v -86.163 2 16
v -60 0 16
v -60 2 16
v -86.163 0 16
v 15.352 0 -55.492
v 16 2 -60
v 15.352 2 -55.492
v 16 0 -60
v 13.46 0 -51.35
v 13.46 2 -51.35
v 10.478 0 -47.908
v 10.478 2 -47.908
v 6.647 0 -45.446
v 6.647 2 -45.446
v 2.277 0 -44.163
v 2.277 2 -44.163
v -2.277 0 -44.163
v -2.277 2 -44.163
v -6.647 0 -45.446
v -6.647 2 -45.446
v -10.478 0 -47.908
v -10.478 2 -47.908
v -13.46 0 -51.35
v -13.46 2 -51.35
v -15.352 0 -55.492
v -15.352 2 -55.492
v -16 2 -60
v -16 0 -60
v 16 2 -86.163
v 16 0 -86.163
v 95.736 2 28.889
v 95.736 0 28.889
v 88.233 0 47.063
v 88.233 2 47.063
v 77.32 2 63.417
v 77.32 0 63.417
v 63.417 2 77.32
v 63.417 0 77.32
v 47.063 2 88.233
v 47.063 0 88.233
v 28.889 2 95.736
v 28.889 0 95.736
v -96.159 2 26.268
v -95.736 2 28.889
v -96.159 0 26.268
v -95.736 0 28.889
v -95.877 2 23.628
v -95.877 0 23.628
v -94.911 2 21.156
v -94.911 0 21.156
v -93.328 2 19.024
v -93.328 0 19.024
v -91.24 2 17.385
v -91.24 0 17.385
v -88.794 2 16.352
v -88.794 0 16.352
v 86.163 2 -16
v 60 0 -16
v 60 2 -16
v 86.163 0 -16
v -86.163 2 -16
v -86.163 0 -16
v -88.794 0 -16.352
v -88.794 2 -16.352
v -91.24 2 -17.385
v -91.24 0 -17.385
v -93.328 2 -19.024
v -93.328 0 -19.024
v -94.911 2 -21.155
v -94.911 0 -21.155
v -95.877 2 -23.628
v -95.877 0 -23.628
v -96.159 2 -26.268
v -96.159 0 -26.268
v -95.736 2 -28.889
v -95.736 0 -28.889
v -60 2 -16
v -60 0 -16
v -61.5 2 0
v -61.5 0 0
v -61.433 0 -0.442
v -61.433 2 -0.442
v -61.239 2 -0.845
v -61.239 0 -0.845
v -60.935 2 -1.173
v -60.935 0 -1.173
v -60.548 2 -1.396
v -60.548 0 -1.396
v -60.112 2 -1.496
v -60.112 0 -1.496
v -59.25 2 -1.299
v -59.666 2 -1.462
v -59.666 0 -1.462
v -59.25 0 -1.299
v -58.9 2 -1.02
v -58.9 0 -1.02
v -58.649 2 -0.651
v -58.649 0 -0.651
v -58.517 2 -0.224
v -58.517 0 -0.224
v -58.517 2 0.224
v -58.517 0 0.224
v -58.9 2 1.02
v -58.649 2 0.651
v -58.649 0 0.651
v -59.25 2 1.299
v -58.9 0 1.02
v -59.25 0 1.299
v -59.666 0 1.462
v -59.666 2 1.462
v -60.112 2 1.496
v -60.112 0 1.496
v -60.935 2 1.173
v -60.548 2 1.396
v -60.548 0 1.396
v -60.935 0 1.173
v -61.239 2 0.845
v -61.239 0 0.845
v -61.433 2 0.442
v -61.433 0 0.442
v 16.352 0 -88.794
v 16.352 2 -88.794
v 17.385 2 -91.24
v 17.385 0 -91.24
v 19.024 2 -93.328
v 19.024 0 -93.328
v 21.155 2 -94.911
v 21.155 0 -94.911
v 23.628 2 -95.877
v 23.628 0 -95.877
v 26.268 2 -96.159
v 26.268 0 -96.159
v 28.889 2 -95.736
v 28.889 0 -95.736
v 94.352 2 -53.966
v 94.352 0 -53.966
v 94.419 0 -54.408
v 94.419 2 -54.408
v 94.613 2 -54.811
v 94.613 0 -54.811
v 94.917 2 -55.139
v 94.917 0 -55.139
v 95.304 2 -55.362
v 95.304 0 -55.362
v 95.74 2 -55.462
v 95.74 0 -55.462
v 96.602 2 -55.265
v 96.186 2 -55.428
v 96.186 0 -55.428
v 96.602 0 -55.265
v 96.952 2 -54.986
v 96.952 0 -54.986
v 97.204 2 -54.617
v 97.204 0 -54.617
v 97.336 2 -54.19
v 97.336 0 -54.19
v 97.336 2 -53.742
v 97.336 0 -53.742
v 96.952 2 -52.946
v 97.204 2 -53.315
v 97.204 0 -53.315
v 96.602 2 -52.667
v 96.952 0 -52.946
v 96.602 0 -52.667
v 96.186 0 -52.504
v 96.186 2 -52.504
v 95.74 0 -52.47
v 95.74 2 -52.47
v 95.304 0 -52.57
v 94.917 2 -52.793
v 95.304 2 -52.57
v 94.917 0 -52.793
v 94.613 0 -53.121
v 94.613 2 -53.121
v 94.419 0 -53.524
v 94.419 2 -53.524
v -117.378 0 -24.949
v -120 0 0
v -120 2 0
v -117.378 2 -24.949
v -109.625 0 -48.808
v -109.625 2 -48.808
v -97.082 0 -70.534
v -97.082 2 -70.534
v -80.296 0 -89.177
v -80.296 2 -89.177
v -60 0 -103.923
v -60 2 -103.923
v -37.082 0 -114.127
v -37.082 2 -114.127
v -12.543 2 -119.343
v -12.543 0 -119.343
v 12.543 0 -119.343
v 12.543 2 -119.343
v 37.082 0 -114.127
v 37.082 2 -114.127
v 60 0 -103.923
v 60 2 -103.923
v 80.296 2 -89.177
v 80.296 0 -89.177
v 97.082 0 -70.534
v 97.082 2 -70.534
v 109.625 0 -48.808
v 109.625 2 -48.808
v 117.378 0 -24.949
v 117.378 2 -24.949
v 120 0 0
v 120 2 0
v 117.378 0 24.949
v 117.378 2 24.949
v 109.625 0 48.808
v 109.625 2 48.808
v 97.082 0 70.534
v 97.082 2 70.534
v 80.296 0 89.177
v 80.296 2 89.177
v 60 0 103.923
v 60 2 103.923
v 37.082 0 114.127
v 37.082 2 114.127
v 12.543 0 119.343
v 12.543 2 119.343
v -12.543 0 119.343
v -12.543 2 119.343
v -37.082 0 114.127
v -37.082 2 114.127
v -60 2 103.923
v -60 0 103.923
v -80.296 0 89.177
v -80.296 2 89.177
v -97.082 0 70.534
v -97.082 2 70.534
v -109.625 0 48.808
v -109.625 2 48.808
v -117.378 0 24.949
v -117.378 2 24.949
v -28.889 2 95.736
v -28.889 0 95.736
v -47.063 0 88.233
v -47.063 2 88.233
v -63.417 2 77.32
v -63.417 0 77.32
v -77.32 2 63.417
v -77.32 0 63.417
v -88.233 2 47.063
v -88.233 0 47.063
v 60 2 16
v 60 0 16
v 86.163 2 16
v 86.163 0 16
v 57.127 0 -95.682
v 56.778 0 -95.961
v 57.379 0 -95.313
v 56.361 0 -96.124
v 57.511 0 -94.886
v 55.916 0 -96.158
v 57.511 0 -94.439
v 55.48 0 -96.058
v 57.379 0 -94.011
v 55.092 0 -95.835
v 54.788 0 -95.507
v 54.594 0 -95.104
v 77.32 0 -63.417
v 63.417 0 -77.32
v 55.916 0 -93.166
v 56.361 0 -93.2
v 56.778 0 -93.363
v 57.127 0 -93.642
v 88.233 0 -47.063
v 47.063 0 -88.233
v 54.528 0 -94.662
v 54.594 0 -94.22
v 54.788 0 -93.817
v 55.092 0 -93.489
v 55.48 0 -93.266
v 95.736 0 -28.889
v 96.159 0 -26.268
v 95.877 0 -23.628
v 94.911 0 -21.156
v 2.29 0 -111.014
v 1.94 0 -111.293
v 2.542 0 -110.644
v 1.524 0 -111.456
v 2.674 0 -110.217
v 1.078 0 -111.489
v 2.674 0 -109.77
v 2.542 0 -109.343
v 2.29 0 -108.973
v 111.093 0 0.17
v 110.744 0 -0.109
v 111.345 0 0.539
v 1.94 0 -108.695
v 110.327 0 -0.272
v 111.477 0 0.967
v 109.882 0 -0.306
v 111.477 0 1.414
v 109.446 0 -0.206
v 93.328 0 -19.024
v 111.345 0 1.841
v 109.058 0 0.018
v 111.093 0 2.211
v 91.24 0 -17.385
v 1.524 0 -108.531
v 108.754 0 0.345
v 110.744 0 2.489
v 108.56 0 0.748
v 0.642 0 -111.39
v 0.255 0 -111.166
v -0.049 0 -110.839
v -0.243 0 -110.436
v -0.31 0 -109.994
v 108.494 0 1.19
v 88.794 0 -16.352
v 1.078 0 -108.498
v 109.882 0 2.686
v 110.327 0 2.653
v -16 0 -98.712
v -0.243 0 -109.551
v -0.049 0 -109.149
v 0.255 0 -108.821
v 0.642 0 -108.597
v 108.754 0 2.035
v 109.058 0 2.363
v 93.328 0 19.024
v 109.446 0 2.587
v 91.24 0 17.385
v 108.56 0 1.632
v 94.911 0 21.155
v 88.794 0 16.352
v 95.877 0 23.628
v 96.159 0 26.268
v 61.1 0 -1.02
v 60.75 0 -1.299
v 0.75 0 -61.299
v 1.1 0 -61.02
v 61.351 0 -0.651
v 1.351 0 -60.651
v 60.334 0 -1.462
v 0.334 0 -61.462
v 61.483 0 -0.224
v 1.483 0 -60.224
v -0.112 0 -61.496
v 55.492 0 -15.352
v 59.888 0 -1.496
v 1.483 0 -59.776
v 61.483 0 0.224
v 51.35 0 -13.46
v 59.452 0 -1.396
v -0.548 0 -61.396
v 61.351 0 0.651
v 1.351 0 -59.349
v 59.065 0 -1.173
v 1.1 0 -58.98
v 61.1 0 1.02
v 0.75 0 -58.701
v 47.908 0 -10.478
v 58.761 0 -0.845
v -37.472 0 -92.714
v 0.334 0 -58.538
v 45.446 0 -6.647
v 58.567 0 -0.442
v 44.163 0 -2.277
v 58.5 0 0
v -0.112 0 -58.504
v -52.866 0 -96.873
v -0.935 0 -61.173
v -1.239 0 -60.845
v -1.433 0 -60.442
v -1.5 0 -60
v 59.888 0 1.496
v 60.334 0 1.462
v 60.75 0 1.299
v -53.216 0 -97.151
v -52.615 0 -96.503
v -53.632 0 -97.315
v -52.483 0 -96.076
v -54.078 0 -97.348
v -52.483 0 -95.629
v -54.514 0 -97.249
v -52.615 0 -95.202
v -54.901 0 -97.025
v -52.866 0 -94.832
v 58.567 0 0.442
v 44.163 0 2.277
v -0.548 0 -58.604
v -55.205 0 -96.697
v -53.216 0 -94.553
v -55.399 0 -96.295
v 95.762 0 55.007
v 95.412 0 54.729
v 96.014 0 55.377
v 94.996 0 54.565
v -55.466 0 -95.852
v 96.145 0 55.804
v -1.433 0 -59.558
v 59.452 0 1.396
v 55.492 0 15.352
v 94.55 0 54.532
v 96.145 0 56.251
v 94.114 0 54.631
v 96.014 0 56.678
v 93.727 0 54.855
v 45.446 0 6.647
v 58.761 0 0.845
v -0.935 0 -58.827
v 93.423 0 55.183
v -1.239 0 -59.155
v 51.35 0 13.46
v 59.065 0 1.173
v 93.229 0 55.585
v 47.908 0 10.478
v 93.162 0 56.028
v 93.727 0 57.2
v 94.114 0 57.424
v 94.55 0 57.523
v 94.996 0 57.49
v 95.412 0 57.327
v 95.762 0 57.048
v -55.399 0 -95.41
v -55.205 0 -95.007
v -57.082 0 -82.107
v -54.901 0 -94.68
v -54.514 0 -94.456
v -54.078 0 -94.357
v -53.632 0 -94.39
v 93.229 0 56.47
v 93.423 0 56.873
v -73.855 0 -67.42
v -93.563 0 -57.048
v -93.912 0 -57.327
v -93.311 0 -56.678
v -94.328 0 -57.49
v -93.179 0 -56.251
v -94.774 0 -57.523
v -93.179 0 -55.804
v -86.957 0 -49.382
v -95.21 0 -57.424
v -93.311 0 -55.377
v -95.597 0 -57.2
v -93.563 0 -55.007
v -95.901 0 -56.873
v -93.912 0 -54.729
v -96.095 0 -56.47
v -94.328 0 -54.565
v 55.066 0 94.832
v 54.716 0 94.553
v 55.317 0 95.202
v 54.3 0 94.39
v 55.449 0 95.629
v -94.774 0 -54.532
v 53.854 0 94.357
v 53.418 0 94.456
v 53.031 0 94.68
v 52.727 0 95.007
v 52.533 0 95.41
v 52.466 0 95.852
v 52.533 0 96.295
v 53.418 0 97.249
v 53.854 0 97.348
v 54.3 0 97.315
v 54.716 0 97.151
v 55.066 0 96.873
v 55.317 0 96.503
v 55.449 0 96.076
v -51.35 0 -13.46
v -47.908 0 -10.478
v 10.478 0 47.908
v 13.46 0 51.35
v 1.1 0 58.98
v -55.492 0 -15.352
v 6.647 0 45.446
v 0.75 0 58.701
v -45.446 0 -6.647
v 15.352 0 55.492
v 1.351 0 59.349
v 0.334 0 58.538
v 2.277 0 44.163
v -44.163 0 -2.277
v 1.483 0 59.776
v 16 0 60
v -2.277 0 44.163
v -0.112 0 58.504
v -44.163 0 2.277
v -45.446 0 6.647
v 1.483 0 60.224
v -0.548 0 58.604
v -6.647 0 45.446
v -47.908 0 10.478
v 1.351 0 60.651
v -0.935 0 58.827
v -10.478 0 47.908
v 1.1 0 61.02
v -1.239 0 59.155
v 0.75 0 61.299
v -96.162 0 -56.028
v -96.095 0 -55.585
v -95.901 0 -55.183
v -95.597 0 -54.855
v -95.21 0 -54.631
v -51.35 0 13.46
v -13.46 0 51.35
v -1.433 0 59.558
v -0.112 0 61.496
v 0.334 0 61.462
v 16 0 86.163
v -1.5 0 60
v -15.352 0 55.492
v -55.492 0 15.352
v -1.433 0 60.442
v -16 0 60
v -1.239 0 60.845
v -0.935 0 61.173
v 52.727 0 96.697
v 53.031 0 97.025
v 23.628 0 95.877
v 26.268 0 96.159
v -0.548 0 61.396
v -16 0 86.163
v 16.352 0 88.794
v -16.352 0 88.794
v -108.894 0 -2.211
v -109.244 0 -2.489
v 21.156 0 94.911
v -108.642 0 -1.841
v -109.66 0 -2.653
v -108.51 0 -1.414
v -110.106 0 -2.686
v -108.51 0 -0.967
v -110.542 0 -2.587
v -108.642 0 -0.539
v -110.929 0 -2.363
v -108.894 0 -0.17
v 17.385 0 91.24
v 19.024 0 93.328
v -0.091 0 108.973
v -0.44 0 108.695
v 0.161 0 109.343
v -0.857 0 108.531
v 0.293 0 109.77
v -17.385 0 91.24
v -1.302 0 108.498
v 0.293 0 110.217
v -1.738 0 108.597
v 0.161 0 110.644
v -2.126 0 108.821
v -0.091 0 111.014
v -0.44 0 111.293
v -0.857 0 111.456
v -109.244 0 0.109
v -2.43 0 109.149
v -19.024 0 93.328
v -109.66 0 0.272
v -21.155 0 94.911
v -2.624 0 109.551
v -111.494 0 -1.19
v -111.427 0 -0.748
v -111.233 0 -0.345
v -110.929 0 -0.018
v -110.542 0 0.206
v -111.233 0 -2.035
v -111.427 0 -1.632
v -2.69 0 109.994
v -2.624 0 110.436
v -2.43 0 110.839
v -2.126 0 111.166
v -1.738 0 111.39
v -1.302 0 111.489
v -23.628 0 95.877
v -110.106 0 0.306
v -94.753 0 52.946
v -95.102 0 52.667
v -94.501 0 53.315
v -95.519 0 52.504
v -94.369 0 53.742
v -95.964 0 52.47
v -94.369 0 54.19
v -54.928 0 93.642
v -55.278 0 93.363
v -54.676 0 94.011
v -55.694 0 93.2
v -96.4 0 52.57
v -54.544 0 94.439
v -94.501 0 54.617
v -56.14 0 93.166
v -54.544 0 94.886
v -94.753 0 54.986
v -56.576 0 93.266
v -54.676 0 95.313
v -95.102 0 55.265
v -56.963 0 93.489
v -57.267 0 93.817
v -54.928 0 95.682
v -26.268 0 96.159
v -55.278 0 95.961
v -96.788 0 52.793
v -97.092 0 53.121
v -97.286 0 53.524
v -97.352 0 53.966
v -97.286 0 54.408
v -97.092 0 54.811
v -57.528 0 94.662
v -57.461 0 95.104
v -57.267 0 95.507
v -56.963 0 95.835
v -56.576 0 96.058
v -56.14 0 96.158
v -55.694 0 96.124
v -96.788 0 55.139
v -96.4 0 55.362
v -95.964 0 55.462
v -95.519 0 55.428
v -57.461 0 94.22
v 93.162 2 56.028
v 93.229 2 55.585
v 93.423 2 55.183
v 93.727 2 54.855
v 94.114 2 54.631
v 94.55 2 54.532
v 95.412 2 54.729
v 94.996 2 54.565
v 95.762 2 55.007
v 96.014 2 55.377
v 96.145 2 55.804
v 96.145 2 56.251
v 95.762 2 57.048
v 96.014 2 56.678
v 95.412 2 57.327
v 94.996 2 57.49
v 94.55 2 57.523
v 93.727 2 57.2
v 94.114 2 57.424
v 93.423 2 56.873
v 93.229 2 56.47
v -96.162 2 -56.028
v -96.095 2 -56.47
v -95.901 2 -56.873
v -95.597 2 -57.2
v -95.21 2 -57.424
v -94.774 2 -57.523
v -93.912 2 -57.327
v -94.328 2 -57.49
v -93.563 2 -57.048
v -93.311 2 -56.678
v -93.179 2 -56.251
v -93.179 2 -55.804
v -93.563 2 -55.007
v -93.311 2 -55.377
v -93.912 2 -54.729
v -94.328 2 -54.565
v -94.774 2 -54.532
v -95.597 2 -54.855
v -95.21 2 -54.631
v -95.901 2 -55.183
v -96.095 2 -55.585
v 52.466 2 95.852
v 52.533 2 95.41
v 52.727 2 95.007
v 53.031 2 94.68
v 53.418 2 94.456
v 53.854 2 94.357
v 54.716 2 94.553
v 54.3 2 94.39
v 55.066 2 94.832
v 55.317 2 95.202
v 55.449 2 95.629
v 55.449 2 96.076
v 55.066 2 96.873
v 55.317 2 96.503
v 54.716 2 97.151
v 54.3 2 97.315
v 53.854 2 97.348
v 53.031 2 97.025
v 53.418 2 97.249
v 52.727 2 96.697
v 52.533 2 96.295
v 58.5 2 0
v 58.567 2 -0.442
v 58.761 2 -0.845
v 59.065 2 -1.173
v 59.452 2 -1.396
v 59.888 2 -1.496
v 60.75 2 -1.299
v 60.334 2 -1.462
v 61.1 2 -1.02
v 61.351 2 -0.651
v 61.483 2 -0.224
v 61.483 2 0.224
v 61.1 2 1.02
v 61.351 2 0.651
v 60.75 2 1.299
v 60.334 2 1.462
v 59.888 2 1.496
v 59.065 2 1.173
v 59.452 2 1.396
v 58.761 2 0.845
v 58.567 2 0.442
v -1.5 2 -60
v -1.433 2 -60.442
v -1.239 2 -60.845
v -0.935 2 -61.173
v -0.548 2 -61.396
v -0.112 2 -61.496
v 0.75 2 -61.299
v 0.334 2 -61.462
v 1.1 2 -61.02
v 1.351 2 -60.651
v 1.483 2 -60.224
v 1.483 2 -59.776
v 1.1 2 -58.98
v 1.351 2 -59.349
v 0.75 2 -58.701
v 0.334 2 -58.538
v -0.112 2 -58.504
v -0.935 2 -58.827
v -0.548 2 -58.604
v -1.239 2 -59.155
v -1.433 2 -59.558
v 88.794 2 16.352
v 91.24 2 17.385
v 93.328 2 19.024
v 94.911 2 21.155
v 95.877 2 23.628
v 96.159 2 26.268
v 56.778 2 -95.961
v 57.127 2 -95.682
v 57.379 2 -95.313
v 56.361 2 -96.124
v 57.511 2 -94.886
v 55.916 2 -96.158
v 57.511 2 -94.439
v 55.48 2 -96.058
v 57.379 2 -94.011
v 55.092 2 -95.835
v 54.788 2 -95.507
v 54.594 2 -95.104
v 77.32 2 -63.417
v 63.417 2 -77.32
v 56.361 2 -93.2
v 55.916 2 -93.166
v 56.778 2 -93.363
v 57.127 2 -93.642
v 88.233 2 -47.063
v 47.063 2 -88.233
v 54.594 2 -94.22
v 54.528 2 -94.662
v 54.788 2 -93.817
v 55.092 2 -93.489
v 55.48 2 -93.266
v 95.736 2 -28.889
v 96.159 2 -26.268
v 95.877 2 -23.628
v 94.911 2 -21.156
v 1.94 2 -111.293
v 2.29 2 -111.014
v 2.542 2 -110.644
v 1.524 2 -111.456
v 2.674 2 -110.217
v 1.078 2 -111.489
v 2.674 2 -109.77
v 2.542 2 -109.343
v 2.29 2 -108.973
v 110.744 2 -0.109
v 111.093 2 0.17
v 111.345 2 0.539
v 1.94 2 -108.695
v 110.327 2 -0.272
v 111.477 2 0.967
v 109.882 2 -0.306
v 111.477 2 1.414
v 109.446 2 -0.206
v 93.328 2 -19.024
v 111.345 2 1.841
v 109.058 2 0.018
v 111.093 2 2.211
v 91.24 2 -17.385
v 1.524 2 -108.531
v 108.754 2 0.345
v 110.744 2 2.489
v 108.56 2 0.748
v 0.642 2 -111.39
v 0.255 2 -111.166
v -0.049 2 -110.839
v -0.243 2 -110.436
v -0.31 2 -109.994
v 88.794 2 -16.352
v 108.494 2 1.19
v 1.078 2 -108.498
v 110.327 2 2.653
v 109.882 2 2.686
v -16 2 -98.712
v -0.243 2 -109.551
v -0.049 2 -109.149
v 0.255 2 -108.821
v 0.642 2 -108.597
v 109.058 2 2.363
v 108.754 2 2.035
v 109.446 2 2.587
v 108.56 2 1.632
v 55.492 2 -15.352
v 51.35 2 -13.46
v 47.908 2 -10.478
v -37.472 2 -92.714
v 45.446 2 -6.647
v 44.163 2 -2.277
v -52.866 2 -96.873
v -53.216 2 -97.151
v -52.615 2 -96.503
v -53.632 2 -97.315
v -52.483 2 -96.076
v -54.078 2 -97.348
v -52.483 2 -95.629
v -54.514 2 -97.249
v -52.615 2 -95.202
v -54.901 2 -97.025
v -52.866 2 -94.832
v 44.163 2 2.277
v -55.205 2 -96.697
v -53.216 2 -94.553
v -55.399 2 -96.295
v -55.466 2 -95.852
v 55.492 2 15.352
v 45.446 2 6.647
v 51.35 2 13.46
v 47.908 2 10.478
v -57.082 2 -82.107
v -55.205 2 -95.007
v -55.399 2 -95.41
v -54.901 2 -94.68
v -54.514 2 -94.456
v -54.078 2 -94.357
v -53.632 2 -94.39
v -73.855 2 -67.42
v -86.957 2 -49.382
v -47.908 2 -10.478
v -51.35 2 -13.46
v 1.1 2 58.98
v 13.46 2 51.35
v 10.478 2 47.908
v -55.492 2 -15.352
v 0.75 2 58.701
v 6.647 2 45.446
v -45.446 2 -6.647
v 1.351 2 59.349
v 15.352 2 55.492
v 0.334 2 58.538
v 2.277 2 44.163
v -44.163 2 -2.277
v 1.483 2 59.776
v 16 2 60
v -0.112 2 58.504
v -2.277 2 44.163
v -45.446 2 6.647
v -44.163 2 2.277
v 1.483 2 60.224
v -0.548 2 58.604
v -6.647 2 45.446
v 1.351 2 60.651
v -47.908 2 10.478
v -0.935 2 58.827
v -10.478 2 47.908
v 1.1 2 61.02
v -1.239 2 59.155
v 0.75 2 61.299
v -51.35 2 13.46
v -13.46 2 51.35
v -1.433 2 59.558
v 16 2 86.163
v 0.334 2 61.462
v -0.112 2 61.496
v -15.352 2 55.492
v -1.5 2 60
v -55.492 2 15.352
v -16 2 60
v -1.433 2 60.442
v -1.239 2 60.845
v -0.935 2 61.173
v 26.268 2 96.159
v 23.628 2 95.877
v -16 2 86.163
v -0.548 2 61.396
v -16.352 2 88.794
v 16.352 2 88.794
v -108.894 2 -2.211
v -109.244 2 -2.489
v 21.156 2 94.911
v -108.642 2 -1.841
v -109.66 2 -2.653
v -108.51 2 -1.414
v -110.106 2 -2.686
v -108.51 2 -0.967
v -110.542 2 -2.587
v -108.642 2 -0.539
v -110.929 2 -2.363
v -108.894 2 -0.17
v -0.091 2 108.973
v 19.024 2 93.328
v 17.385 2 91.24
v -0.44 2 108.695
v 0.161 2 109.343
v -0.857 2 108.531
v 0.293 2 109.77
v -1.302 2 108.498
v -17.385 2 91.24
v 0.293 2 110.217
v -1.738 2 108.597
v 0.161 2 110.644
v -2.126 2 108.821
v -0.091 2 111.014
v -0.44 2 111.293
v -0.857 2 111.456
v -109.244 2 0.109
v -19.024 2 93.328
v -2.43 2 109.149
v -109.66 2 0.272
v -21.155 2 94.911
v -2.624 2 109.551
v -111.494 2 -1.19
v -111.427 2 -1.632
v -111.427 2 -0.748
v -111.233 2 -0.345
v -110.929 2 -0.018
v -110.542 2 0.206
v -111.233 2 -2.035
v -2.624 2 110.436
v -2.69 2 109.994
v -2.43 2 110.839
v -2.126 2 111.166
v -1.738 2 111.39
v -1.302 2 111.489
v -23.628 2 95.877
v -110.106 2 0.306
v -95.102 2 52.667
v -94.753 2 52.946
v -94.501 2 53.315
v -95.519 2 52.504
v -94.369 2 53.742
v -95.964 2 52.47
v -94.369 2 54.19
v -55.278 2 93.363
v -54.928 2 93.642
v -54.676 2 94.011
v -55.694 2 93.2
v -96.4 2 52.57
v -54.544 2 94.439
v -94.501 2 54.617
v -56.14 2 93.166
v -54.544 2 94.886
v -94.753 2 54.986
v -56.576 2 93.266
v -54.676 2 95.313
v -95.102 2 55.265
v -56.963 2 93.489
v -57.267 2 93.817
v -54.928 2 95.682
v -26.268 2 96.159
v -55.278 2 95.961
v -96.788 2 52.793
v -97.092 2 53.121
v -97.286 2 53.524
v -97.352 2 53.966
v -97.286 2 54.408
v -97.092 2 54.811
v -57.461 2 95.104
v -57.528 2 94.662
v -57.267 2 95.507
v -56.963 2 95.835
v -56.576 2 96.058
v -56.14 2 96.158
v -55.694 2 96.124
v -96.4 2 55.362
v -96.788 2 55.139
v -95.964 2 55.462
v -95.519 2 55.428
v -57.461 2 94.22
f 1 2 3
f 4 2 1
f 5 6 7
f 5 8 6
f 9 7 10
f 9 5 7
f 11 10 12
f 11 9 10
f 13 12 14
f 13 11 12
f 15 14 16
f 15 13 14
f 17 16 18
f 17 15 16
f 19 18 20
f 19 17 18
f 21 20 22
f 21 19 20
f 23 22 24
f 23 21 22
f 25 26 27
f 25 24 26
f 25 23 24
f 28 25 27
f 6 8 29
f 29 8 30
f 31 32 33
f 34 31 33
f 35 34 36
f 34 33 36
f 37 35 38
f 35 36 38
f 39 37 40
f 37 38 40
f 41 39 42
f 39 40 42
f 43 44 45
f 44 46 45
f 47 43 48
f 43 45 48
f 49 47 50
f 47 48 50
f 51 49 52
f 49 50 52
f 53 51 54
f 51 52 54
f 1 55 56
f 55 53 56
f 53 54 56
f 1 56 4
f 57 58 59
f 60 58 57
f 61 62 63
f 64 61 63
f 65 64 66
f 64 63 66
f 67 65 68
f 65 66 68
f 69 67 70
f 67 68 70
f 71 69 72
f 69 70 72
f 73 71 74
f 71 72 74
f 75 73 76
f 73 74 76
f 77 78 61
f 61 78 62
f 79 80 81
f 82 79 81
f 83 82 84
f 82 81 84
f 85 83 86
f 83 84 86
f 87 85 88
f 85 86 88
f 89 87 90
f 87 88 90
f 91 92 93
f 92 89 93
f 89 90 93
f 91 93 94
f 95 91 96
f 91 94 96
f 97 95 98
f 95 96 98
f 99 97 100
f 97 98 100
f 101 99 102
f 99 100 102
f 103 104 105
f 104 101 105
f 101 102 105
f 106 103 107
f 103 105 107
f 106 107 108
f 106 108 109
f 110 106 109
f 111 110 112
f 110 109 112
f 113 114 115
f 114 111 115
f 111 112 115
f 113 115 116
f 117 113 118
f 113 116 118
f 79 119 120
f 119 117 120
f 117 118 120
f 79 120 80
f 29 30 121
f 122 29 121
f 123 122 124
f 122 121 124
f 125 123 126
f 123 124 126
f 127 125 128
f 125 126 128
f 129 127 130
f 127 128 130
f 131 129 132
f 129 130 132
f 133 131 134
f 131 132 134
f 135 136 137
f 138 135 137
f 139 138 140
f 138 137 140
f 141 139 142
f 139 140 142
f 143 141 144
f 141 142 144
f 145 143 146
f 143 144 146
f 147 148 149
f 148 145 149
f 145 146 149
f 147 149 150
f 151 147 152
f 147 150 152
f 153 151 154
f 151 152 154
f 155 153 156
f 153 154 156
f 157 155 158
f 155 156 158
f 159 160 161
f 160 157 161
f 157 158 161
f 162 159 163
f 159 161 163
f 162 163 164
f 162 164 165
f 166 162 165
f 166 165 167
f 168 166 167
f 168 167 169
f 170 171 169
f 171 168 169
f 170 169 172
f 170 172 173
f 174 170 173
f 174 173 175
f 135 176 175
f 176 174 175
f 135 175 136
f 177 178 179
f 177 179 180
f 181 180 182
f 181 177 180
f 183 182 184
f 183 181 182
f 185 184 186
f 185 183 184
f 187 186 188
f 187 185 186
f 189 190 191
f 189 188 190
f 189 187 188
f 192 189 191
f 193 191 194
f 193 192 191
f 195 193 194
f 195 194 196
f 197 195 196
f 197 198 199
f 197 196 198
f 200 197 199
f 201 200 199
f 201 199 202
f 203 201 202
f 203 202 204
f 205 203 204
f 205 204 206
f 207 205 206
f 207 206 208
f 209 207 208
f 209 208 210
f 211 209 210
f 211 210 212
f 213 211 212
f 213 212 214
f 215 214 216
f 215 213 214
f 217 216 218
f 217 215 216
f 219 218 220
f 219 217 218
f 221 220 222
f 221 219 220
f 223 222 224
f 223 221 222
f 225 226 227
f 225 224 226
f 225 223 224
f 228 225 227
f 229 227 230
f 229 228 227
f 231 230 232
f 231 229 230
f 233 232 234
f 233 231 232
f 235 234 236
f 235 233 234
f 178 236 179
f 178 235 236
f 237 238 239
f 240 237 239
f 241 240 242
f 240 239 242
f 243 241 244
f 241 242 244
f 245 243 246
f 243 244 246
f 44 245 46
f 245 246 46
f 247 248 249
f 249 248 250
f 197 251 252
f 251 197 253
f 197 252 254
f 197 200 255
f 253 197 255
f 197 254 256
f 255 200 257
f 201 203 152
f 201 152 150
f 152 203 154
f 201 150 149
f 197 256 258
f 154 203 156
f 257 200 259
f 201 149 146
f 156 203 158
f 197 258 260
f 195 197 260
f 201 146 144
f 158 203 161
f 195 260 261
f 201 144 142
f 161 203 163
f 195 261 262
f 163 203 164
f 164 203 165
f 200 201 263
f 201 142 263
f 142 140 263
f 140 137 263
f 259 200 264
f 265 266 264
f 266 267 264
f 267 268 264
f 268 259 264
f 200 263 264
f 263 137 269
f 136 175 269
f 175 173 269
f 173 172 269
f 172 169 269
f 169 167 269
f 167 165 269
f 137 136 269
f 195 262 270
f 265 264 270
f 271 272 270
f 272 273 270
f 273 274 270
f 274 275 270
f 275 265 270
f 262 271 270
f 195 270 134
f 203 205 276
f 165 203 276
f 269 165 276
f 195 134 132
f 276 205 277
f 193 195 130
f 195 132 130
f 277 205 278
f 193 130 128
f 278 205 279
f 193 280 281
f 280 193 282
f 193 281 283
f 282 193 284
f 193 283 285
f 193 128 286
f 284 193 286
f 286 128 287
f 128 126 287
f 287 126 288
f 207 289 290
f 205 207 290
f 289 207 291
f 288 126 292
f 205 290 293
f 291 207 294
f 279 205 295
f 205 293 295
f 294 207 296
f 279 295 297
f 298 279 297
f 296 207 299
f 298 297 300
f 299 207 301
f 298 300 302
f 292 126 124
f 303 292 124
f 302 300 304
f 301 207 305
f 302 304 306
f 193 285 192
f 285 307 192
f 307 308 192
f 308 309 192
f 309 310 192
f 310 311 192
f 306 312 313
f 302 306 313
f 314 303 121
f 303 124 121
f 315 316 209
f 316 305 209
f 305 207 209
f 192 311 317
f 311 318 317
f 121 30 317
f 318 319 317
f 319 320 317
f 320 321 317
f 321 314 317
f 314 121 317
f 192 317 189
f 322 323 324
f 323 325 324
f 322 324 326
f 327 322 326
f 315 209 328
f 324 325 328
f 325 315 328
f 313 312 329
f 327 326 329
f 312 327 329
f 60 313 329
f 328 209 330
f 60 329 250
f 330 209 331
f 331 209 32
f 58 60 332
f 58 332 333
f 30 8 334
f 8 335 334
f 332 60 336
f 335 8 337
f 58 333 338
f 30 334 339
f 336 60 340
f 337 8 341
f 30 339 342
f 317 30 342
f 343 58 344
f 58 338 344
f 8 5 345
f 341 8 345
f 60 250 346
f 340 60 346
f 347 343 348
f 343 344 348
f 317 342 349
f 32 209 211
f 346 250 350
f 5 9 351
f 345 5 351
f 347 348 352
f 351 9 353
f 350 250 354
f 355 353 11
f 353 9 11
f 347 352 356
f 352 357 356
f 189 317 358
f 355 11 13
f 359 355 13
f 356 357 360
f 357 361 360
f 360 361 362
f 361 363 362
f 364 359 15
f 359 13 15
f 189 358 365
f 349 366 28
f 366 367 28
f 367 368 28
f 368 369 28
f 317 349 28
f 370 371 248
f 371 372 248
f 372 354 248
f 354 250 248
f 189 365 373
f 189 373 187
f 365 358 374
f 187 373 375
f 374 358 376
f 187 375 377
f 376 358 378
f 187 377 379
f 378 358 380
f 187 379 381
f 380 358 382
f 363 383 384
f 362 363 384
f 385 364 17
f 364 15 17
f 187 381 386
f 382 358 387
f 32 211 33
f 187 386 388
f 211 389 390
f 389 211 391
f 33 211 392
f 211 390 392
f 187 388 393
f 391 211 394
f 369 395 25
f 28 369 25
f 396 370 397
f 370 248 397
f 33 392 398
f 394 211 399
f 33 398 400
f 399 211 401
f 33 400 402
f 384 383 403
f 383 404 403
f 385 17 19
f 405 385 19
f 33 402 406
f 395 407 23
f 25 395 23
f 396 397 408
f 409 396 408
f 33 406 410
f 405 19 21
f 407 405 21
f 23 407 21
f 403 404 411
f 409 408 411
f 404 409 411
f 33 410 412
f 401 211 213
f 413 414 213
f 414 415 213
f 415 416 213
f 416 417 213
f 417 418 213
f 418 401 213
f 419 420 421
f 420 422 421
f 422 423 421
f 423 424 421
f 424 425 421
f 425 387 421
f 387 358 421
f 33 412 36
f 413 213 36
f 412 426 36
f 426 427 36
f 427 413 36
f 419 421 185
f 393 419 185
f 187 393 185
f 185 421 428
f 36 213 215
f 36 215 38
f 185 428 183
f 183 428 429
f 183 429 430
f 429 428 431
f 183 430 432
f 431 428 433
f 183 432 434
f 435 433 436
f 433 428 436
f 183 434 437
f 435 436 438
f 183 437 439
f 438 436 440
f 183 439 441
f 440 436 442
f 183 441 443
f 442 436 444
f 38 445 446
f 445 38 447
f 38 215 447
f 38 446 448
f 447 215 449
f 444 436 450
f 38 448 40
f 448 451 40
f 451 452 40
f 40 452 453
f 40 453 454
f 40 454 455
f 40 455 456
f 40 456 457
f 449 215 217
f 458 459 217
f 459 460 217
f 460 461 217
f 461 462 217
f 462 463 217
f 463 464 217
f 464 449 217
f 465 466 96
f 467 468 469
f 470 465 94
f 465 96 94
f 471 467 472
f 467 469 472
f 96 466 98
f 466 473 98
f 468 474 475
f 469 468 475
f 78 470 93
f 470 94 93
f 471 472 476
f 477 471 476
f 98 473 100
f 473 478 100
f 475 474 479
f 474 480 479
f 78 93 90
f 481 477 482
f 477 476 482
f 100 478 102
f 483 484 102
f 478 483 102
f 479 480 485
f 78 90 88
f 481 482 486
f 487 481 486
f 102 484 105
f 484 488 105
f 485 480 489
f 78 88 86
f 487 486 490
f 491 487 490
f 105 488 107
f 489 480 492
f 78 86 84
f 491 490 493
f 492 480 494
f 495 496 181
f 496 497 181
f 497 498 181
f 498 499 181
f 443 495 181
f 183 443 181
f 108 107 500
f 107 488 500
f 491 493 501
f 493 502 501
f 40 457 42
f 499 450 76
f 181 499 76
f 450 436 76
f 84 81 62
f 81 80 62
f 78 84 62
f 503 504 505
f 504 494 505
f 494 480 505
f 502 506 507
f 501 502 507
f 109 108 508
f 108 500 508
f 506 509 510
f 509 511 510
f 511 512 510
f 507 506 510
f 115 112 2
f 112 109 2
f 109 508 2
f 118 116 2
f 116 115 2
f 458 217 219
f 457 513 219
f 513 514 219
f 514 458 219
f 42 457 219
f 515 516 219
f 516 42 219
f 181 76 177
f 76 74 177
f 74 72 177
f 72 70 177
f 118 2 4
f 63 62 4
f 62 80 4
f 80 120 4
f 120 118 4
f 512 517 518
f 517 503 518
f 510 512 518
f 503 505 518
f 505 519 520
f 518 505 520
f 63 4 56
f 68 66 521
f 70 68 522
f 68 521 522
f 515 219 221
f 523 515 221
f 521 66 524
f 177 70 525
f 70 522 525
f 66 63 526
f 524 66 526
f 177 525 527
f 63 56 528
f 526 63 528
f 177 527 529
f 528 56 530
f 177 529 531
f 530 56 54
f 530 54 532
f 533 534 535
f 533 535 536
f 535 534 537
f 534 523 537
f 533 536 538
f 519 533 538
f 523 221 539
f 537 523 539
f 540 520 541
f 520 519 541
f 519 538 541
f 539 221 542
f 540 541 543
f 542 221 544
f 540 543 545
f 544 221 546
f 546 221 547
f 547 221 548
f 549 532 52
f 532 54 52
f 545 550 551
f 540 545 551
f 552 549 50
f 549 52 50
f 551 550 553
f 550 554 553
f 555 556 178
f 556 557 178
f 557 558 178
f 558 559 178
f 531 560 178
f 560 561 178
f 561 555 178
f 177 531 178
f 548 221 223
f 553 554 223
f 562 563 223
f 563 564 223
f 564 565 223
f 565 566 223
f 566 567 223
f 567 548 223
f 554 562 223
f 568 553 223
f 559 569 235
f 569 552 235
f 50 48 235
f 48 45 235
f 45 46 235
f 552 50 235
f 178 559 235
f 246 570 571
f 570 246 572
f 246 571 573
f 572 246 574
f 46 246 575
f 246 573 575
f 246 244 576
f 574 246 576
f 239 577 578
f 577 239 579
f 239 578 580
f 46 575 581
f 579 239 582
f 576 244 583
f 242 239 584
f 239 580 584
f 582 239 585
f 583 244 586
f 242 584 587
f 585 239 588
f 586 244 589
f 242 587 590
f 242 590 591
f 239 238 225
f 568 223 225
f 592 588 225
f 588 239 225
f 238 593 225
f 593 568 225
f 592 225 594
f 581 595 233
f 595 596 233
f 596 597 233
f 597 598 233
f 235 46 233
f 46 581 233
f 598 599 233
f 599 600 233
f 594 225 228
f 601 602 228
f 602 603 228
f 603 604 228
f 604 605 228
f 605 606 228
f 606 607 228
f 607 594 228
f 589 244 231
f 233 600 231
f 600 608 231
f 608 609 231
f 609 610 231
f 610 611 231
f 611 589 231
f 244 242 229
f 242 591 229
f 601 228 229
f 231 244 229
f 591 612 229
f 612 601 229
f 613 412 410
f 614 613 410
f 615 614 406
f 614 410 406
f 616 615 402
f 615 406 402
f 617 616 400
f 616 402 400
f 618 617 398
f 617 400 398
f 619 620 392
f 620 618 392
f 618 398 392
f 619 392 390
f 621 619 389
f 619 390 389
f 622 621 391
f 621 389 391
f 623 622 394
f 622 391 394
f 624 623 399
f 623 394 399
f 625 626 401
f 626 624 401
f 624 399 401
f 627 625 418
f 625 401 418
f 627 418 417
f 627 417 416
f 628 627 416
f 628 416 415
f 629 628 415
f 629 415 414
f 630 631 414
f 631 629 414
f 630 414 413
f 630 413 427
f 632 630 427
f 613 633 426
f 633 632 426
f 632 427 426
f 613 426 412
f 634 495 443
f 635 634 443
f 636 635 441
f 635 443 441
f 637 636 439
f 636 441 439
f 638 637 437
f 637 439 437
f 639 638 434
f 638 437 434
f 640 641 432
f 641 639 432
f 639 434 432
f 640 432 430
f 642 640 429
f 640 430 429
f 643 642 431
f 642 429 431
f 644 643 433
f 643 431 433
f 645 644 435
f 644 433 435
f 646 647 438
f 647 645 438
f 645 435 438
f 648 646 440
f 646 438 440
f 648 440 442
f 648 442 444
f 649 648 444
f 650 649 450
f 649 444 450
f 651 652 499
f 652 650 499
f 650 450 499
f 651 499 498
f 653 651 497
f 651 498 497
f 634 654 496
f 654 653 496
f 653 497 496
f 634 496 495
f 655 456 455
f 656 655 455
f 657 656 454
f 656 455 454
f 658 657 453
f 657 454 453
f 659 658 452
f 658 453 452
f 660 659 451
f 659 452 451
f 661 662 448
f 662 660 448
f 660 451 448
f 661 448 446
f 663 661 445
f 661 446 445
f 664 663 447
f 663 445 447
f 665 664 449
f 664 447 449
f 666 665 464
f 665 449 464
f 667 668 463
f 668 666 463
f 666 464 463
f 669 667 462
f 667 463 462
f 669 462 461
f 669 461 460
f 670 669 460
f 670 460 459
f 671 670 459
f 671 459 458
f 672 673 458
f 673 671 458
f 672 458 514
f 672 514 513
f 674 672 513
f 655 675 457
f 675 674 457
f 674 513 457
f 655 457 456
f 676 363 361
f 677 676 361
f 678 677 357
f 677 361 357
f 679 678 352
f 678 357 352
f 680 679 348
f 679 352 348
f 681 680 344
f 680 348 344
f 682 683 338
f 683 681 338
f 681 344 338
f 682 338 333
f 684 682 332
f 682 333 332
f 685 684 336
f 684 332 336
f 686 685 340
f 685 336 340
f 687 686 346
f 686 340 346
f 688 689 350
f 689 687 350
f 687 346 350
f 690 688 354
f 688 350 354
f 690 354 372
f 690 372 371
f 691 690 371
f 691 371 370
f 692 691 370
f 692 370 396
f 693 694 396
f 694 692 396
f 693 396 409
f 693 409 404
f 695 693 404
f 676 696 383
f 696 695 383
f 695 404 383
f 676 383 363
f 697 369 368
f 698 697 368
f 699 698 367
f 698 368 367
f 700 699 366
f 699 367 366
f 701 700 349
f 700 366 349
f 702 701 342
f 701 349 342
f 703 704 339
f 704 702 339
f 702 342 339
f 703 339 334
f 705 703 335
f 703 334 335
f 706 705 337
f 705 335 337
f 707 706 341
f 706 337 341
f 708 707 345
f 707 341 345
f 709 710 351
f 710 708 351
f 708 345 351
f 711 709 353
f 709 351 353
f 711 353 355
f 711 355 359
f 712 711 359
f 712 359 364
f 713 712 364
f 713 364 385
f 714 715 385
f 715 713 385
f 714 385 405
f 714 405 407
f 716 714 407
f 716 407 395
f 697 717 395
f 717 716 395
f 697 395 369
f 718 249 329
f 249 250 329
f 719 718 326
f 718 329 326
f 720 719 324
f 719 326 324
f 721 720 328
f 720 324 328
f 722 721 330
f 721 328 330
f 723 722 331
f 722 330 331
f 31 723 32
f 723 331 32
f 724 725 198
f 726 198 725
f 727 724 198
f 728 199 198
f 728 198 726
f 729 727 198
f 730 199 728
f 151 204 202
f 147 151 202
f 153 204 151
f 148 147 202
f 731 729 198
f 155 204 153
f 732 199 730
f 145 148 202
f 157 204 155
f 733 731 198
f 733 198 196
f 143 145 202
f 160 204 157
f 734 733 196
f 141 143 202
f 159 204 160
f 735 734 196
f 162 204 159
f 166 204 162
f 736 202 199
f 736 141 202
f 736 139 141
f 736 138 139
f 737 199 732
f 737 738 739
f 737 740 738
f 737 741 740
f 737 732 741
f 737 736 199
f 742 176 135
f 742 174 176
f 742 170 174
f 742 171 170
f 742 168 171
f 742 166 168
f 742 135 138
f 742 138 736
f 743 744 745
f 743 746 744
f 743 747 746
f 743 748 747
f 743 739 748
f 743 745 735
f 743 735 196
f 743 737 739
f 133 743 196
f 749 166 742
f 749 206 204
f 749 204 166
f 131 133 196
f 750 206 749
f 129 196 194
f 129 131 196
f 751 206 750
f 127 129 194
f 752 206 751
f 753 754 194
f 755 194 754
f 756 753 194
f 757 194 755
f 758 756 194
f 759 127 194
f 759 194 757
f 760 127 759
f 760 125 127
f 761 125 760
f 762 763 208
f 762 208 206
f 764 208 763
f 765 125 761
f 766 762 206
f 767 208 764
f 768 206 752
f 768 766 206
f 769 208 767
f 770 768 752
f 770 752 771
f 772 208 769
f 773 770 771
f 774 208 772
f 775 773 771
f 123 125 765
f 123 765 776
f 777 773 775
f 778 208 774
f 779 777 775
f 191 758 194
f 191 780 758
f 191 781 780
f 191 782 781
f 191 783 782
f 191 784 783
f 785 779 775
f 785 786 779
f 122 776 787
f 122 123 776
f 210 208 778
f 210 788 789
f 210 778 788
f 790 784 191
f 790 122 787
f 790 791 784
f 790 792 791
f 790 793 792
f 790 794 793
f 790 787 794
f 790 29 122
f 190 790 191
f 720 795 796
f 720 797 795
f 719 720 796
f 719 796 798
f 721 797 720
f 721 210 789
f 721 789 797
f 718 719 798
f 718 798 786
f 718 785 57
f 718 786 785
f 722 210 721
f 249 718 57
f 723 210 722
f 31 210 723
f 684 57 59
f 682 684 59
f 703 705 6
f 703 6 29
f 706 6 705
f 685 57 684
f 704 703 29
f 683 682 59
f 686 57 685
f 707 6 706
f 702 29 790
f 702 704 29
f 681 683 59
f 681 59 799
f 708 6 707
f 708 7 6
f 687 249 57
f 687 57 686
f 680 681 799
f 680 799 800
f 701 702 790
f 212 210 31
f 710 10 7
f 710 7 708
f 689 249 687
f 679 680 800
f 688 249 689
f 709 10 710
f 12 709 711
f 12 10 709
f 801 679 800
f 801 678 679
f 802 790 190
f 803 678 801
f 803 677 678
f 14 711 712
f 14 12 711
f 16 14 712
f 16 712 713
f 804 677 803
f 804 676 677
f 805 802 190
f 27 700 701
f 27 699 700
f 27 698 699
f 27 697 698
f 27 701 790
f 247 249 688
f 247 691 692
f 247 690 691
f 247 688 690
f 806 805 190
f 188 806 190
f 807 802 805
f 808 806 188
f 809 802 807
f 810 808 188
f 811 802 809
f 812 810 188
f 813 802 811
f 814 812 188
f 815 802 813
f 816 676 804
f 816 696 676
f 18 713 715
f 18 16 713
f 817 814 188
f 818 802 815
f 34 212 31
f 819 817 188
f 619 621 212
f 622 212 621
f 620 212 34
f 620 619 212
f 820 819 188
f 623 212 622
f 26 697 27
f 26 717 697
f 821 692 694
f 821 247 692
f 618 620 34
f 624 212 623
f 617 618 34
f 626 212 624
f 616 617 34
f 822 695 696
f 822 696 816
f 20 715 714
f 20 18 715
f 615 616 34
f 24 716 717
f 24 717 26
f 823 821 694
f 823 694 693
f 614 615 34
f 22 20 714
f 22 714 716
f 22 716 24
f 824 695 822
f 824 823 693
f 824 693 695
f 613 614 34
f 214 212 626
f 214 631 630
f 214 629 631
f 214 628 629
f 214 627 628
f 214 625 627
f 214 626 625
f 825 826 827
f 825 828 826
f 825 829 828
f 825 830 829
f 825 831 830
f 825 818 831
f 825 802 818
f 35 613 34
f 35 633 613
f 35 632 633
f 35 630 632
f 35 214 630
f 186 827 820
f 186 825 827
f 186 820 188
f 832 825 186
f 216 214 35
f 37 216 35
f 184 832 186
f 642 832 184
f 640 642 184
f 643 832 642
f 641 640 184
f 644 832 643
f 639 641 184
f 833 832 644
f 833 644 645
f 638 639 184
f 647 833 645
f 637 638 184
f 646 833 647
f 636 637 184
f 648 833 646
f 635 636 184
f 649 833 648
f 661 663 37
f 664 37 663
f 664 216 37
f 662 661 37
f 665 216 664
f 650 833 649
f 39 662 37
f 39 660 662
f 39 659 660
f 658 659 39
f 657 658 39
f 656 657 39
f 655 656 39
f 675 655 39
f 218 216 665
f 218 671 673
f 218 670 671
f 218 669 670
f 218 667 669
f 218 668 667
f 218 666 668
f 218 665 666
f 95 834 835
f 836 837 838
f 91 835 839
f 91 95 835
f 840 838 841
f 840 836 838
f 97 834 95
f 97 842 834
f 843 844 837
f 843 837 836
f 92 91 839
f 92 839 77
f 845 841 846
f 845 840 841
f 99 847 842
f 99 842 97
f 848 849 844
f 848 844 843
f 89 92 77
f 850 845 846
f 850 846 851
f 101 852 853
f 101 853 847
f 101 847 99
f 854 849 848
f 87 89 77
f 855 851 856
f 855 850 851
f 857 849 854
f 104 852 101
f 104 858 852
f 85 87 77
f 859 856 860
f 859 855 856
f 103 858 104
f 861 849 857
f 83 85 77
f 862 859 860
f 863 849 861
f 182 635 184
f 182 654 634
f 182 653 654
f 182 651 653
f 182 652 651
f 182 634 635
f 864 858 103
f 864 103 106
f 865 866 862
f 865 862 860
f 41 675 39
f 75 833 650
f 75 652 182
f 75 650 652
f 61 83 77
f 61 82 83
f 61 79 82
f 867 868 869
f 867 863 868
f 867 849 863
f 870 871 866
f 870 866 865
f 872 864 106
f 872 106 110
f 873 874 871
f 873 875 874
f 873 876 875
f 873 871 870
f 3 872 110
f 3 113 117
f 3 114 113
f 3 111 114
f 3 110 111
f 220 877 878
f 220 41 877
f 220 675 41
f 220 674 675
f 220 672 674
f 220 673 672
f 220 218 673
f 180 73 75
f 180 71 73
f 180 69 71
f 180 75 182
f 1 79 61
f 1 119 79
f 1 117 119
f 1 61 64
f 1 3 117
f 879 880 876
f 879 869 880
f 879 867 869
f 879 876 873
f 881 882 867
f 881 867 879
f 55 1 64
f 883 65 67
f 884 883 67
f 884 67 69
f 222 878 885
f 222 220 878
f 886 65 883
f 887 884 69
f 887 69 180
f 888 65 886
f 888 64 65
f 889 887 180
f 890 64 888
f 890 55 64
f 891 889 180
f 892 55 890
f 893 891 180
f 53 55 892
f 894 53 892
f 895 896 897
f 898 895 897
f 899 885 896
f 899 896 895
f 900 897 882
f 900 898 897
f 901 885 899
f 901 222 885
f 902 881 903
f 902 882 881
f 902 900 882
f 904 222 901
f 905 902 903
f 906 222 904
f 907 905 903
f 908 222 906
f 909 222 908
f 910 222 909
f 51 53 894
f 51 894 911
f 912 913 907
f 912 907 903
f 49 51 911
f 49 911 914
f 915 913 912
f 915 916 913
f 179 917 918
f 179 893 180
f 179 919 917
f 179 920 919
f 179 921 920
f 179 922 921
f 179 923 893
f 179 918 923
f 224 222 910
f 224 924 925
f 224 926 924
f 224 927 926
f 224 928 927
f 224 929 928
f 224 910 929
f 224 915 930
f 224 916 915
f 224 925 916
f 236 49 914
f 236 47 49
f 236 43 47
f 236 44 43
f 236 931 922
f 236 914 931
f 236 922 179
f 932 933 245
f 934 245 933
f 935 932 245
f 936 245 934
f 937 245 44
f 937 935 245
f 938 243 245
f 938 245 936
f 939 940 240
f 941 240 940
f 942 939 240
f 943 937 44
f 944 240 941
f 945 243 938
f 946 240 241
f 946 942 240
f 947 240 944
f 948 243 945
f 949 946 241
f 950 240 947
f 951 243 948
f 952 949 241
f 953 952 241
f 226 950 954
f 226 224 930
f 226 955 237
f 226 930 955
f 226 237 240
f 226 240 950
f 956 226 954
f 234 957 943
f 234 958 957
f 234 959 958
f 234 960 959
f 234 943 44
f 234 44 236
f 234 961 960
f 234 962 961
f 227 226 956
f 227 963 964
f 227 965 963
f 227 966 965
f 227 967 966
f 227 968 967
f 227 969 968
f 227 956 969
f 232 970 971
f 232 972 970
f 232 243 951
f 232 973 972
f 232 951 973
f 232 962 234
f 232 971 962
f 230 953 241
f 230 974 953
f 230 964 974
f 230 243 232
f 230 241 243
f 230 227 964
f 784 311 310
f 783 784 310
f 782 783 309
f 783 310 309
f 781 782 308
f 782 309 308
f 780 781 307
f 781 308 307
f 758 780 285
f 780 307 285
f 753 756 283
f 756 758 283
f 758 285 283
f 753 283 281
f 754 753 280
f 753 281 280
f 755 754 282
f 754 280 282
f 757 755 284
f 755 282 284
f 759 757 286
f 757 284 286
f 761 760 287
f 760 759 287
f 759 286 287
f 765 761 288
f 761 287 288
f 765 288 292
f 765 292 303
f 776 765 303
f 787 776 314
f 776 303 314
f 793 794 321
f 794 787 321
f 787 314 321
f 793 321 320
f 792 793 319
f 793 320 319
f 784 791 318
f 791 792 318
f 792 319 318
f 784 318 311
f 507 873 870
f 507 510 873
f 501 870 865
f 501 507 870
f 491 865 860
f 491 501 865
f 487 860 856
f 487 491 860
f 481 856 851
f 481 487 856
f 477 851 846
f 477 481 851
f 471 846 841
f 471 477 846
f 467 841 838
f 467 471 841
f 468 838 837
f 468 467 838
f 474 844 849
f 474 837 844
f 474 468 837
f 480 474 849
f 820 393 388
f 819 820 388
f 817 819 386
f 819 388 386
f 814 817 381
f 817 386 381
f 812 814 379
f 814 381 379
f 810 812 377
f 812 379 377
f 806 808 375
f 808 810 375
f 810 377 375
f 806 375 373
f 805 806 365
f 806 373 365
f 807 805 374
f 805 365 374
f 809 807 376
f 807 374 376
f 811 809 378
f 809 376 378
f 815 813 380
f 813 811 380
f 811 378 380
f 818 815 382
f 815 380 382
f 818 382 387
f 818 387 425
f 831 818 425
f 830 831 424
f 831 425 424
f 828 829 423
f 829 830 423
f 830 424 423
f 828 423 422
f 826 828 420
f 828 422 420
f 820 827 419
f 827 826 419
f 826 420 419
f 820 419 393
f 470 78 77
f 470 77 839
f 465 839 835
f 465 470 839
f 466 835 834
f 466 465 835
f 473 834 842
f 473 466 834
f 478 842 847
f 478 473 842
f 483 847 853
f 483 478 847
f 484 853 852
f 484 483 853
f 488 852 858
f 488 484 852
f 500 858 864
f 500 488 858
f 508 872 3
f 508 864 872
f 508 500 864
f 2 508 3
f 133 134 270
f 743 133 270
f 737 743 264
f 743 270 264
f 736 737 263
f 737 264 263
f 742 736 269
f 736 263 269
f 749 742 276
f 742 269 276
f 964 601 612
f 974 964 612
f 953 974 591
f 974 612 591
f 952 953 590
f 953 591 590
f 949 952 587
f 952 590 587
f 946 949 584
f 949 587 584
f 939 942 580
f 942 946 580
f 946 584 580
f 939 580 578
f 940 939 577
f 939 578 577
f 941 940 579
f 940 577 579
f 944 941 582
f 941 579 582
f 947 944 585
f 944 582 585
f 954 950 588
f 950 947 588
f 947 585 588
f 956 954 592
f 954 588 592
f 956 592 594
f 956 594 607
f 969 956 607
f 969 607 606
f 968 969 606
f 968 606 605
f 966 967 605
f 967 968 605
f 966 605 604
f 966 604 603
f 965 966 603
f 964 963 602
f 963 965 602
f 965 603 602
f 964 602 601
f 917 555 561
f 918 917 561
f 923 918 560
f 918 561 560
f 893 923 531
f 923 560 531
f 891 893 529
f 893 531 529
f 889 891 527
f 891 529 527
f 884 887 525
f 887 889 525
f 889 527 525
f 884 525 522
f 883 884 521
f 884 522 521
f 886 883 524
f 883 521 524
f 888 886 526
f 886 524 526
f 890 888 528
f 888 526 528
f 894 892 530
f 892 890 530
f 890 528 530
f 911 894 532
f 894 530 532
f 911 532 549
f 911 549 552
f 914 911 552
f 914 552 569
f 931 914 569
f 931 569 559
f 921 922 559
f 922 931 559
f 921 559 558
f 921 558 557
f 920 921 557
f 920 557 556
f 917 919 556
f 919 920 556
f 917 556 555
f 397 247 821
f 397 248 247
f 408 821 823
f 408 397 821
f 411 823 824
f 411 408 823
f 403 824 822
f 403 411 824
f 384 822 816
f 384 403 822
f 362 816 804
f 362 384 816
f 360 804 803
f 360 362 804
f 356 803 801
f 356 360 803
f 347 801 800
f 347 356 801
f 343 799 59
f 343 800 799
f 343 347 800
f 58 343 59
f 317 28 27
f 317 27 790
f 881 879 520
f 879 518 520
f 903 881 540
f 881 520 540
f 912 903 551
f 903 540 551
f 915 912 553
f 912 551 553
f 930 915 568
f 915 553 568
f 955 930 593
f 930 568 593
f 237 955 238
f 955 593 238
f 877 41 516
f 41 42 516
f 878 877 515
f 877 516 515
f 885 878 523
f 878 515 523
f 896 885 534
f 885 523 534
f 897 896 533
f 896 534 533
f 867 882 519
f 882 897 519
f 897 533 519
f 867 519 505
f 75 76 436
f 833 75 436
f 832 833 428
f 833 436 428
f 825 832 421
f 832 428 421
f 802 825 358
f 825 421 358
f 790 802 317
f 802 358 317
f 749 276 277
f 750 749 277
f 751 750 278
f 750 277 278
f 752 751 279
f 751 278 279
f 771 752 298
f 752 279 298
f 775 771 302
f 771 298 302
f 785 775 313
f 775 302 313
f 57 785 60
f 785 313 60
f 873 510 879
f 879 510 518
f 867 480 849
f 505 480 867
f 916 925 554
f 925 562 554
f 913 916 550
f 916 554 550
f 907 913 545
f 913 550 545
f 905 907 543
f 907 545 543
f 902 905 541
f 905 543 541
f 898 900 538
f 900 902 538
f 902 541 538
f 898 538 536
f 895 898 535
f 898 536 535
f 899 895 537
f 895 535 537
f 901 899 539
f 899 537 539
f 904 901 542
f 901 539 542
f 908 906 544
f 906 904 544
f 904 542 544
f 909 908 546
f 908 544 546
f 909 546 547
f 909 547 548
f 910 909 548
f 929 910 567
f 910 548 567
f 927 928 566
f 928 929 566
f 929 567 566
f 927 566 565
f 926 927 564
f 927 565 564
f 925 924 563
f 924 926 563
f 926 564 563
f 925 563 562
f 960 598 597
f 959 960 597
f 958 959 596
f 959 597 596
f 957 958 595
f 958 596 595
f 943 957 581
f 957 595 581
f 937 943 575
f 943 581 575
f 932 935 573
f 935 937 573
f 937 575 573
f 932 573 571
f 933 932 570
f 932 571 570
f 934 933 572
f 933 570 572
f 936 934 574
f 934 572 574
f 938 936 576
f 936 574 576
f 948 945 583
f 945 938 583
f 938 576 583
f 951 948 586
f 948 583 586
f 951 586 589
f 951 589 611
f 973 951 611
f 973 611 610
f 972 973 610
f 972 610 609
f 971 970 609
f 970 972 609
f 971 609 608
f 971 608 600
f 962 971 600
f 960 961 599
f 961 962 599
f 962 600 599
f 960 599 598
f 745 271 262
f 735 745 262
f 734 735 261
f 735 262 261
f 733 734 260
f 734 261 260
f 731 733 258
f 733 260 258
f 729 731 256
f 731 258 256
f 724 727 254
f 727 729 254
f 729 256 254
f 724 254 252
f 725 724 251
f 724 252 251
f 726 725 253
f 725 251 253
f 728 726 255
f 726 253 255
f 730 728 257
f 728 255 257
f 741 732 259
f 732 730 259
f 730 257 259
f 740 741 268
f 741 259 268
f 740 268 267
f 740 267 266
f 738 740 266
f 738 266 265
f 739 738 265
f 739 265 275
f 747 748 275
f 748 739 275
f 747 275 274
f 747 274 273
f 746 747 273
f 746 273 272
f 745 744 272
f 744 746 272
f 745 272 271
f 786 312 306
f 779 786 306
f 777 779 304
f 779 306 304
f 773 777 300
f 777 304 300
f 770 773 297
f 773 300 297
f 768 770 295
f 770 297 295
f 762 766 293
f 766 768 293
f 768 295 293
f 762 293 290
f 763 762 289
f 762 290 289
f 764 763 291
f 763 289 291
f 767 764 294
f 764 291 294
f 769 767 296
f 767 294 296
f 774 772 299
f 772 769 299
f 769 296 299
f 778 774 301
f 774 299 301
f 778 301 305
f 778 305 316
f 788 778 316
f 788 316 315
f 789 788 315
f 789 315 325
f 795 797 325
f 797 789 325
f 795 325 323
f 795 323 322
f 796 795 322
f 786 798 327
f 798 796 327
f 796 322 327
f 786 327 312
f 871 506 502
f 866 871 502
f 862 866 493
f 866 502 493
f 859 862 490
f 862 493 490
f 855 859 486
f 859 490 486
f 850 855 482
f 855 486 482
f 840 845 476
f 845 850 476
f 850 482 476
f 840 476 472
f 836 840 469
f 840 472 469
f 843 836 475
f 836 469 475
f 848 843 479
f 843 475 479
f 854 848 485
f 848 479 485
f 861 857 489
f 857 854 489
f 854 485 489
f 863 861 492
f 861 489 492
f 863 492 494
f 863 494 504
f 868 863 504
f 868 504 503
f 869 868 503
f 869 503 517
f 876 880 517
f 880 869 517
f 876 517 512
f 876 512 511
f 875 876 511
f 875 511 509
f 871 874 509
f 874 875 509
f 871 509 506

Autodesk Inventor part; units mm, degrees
ref_plane "YZ Plane" through (0, 0, 0) normal (1, 0, 0) x (0, 1, 0)
ref_plane "XZ Plane" through (0, 0, 0) normal (0, 1, 0) x (-1, 0, 0)
ref_plane "XY Plane" through (0, 0, 0) normal (0, 0, 1) x (1, 0, 0)
sketch "Sketch1" plane through (0, 0, 0) normal (0, 1, 0) x (-1, 0, 0)
  circle A0 centre (60, 0) radius 1.5
  circle A1 centre (0, -60) radius 1.5
  circle A2 centre (-60, 0) radius 1.5
  circle A3 centre (0, 60) radius 1.5
  arc A4 (60, 16) -> (60, -16) centre (60, 0) ccw
  arc A5 (16, -60) -> (-16, -60) centre (0, -60) ccw
  arc A6 (-60, -16) -> (-60, 16) centre (-60, 0) ccw
  arc A7 (-16, 60) -> (16, 60) centre (0, 60) ccw
  circle A8 centre (0, 0) radius 120
  line L0 (16, 60) -> (16, 86.1626)
  line L1 (-16, 60) -> (-16, 86.1626)
  line L2 (-60, 16) -> (-86.1626, 16)
  line L3 (-60, -16) -> (-86.1626, -16)
  line L4 (-16, -60) -> (-16, -86.1626)
  line L5 (16, -60) -> (16, -98.7117)
  line L6 (60, 16) -> (86.1626, 16)
  line L7 (60, -16) -> (86.1626, -16)
  arc A9 (-28.8889, 95.7363) -> (-95.7363, 28.8889) centre (0, 0) ccw
  arc A10 (-95.7363, -28.8889) -> (-28.8889, -95.7363) centre (0, 0) ccw
  arc A11 (16, -98.7117) -> (95.7363, -28.8889) centre (0, 0) ccw
  arc A12 (95.7363, 28.8889) -> (28.8889, 95.7363) centre (0, 0) ccw
  arc A13 (28.8889, 95.7363) -> (16, 86.1626) centre (26, 86.1626) ccw
  arc A14 (86.1626, 16) -> (95.7363, 28.8889) centre (86.1626, 26) ccw
  arc A15 (95.7363, -28.8889) -> (86.1626, -16) centre (86.1626, -26) ccw
  arc A16 (-28.8889, -95.7363) -> (-16, -86.1626) centre (-26, -86.1626) ccw
  arc A17 (-86.1626, -16) -> (-95.7363, -28.8889) centre (-86.1626, -26) ccw
  arc A18 (-95.7363, 28.8889) -> (-86.1626, 16) centre (-86.1626, 26) ccw
  arc A19 (-16, 86.1626) -> (-28.8889, 95.7363) centre (-26, 86.1626) ccw
  line L8 (0, 0) -> (110, 0) construction
  circle A20 centre (95.8524, 53.966) radius 1.5
  circle A21 centre (56.0276, 94.6621) radius 1.5
  circle A22 centre (1.1903, 109.9936) radius 1.5
  circle A23 centre (-53.966, 95.8524) radius 1.5
  circle A24 centre (-94.6621, 56.0276) radius 1.5
  circle A25 centre (-109.9936, 1.1903) radius 1.5
  circle A26 centre (-95.8524, -53.966) radius 1.5
  circle A27 centre (-56.0276, -94.6621) radius 1.5
  circle A28 centre (-1.1903, -109.9936) radius 1.5
  circle A29 centre (53.966, -95.8524) radius 1.5
  circle A30 centre (94.6621, -56.0276) radius 1.5
  circle A31 centre (109.9936, -1.1903) radius 1.5
  point P0 (16, 98.7117)
  point P1 (-16, 98.7117)
  point P2 (-98.7117, 16)
  point P3 (-98.7117, -16)
  point P4 (-16, -98.7117)
  point P5 (98.7117, 16)
  point P6 (98.7117, -16)
  dimension "d1" = 3
  dimension "d2" = 3
  dimension "d3" = 3
  dimension "d4" = 3
  dimension "d5" = 32
  dimension "d6" = 32
  dimension "d7" = 32
  dimension "d8" = 32
  dimension "d14" = 10
  dimension "d17" = 3
  dimension "d20" = 360
extrude "Extrusion1" add sketch "Sketch1" along normal blind 2
properties part number "shell top bracket"
